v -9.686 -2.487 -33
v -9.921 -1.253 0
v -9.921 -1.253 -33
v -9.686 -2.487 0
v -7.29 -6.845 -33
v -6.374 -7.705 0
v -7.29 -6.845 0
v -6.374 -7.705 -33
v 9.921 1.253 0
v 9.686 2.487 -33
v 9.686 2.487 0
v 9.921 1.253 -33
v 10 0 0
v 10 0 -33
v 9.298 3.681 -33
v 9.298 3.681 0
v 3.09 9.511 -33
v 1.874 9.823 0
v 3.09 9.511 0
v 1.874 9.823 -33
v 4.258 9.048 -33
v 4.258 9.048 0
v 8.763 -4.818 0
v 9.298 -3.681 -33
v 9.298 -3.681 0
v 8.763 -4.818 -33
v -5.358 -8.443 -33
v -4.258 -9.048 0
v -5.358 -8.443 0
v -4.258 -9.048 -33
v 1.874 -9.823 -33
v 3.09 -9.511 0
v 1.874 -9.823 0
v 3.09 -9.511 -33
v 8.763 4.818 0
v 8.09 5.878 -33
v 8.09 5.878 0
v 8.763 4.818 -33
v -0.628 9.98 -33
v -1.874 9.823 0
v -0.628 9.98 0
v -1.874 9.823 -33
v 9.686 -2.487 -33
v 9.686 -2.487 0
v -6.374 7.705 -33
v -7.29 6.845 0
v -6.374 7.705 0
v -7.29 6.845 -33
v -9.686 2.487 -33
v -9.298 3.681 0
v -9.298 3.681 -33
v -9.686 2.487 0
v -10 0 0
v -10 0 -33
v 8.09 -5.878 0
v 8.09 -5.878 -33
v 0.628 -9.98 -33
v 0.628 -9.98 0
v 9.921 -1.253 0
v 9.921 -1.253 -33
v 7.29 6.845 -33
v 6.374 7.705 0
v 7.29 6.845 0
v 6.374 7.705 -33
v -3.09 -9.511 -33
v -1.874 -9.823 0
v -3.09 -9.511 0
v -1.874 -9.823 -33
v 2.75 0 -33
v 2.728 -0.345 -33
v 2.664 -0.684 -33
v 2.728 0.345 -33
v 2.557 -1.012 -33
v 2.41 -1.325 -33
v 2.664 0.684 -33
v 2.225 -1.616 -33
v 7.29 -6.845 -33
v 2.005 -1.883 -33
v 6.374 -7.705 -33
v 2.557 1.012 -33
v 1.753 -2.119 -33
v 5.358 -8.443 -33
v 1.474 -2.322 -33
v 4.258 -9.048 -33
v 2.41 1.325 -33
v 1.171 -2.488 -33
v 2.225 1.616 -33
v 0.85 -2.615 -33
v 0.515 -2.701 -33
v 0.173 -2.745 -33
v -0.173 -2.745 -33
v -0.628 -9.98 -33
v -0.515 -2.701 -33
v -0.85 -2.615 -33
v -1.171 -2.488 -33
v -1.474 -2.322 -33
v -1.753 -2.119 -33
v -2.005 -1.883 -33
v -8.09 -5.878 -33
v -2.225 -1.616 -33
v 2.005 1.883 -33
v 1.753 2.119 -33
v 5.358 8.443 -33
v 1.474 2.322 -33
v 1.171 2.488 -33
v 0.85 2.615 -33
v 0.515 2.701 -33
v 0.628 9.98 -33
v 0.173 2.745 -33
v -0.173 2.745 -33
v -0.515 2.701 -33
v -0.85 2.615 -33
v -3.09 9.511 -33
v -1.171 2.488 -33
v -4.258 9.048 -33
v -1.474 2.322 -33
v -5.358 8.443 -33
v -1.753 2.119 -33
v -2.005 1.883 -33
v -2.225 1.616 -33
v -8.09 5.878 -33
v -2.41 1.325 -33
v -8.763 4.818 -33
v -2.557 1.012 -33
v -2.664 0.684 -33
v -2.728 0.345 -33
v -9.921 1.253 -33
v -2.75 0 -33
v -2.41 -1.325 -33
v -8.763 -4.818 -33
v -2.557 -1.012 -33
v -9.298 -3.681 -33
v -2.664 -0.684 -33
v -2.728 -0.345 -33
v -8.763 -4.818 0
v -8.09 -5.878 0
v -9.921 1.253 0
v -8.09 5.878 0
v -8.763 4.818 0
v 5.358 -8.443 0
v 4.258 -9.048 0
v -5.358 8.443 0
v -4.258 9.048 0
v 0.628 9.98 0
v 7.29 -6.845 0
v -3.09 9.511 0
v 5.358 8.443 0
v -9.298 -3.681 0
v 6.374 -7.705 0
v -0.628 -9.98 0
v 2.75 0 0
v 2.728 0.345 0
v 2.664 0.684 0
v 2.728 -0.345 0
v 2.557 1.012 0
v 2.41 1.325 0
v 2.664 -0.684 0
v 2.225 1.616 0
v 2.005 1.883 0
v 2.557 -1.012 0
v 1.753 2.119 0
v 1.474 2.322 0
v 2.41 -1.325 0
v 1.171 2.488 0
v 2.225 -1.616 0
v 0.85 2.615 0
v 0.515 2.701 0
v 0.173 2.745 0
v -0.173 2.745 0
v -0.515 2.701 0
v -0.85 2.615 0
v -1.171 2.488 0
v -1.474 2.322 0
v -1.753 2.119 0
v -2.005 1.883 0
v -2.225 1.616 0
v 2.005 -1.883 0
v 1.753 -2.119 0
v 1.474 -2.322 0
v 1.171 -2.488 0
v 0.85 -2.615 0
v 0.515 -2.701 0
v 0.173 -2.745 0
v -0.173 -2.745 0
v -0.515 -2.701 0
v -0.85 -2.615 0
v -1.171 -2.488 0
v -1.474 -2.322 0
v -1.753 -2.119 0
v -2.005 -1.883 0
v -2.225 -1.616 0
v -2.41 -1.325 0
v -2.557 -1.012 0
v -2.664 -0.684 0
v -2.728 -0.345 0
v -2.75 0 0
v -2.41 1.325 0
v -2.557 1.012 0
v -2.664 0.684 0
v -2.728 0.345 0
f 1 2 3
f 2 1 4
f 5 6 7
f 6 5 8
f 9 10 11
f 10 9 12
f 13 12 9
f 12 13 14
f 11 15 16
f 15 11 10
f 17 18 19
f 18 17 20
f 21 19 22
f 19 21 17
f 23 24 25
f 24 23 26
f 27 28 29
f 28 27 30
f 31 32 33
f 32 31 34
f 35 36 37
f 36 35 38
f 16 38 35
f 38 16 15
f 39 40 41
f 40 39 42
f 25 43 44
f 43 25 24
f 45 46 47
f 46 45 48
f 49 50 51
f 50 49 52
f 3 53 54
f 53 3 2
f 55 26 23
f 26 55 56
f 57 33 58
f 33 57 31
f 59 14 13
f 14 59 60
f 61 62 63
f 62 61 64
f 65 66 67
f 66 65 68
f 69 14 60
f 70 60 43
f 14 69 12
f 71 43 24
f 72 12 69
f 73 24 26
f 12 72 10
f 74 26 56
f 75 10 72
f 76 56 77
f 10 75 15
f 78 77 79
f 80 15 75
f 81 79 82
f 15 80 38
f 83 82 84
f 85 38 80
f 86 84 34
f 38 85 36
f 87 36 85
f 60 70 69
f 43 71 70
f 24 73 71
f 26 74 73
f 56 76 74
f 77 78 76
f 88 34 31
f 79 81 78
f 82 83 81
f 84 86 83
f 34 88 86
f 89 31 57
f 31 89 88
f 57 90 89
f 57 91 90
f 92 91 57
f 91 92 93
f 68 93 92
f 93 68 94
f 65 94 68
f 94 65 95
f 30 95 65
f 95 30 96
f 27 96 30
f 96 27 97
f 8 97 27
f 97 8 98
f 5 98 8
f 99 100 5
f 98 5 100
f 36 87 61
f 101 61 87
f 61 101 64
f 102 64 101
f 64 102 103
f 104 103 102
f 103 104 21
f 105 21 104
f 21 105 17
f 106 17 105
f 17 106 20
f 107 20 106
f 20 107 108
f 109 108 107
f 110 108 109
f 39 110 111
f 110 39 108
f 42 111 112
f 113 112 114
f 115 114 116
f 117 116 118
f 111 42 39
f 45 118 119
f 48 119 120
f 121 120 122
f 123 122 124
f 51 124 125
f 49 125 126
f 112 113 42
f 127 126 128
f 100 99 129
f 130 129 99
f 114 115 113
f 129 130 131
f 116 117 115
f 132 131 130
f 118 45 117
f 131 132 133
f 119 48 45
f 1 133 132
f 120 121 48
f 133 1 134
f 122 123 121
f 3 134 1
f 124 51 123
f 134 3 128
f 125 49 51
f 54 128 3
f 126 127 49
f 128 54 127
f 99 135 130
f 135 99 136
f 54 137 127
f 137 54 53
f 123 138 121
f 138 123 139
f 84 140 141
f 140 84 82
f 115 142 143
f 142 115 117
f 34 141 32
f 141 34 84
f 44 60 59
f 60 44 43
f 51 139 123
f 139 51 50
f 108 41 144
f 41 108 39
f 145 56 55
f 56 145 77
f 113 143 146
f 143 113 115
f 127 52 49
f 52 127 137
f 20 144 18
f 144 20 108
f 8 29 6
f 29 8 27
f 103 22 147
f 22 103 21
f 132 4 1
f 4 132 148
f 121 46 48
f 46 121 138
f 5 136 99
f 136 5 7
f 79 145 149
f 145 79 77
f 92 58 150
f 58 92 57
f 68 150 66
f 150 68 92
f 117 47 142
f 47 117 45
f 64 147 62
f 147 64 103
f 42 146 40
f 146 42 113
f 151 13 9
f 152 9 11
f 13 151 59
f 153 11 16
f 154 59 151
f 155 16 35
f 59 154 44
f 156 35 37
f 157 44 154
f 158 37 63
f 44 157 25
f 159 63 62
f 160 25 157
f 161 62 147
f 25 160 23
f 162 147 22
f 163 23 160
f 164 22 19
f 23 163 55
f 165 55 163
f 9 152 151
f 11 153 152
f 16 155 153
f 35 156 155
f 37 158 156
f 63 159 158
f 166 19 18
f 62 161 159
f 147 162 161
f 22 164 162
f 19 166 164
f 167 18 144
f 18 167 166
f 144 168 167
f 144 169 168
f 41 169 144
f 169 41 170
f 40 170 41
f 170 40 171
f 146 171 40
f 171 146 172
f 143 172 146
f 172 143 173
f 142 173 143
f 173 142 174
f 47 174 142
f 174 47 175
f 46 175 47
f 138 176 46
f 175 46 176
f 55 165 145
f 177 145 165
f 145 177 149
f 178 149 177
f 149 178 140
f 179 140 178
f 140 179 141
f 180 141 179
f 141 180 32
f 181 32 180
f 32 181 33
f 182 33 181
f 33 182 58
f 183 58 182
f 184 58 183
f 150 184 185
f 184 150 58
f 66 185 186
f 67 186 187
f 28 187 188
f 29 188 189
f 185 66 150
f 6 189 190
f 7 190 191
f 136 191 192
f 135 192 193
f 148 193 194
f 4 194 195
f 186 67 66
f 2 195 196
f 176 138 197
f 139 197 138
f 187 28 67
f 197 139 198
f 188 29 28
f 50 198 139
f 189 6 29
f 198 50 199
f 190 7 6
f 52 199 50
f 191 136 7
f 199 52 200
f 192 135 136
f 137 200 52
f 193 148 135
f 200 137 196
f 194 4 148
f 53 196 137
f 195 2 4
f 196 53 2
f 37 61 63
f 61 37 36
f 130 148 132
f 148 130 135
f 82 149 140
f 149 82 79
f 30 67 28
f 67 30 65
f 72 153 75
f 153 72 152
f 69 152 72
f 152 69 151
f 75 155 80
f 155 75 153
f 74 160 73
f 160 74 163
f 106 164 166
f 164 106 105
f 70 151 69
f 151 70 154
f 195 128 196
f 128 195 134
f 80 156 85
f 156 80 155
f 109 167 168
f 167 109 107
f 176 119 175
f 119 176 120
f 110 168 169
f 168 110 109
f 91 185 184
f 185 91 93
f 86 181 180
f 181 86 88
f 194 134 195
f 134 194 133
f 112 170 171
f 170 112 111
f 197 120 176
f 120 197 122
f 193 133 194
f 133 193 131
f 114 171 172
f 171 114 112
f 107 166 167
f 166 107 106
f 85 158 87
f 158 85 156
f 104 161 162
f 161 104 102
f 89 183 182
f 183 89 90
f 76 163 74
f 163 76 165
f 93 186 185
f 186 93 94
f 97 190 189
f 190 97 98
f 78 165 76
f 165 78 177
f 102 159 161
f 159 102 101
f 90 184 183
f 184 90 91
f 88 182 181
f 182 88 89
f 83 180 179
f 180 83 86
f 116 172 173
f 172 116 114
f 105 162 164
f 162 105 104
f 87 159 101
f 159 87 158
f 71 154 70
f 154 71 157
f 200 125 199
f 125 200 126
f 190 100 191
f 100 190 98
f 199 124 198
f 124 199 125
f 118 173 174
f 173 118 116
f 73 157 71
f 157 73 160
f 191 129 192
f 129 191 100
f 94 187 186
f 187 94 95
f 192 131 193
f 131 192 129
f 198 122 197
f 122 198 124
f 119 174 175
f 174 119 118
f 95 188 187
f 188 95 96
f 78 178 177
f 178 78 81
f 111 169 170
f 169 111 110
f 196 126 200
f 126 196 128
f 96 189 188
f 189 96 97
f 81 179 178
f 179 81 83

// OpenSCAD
$fn = 50;


difference() {
	union() {
		translate(v = [0, 0, -33.0000000000]) {
			cylinder(h = 33, r = 10.0000000000);
		}
		cylinder(h = 0, r = 13.0000000000);
	}
	union() {
		#translate(v = [0, 0, -33]) {
			cylinder(h = 33, r = 2.7500000000);
		}
	}
}
